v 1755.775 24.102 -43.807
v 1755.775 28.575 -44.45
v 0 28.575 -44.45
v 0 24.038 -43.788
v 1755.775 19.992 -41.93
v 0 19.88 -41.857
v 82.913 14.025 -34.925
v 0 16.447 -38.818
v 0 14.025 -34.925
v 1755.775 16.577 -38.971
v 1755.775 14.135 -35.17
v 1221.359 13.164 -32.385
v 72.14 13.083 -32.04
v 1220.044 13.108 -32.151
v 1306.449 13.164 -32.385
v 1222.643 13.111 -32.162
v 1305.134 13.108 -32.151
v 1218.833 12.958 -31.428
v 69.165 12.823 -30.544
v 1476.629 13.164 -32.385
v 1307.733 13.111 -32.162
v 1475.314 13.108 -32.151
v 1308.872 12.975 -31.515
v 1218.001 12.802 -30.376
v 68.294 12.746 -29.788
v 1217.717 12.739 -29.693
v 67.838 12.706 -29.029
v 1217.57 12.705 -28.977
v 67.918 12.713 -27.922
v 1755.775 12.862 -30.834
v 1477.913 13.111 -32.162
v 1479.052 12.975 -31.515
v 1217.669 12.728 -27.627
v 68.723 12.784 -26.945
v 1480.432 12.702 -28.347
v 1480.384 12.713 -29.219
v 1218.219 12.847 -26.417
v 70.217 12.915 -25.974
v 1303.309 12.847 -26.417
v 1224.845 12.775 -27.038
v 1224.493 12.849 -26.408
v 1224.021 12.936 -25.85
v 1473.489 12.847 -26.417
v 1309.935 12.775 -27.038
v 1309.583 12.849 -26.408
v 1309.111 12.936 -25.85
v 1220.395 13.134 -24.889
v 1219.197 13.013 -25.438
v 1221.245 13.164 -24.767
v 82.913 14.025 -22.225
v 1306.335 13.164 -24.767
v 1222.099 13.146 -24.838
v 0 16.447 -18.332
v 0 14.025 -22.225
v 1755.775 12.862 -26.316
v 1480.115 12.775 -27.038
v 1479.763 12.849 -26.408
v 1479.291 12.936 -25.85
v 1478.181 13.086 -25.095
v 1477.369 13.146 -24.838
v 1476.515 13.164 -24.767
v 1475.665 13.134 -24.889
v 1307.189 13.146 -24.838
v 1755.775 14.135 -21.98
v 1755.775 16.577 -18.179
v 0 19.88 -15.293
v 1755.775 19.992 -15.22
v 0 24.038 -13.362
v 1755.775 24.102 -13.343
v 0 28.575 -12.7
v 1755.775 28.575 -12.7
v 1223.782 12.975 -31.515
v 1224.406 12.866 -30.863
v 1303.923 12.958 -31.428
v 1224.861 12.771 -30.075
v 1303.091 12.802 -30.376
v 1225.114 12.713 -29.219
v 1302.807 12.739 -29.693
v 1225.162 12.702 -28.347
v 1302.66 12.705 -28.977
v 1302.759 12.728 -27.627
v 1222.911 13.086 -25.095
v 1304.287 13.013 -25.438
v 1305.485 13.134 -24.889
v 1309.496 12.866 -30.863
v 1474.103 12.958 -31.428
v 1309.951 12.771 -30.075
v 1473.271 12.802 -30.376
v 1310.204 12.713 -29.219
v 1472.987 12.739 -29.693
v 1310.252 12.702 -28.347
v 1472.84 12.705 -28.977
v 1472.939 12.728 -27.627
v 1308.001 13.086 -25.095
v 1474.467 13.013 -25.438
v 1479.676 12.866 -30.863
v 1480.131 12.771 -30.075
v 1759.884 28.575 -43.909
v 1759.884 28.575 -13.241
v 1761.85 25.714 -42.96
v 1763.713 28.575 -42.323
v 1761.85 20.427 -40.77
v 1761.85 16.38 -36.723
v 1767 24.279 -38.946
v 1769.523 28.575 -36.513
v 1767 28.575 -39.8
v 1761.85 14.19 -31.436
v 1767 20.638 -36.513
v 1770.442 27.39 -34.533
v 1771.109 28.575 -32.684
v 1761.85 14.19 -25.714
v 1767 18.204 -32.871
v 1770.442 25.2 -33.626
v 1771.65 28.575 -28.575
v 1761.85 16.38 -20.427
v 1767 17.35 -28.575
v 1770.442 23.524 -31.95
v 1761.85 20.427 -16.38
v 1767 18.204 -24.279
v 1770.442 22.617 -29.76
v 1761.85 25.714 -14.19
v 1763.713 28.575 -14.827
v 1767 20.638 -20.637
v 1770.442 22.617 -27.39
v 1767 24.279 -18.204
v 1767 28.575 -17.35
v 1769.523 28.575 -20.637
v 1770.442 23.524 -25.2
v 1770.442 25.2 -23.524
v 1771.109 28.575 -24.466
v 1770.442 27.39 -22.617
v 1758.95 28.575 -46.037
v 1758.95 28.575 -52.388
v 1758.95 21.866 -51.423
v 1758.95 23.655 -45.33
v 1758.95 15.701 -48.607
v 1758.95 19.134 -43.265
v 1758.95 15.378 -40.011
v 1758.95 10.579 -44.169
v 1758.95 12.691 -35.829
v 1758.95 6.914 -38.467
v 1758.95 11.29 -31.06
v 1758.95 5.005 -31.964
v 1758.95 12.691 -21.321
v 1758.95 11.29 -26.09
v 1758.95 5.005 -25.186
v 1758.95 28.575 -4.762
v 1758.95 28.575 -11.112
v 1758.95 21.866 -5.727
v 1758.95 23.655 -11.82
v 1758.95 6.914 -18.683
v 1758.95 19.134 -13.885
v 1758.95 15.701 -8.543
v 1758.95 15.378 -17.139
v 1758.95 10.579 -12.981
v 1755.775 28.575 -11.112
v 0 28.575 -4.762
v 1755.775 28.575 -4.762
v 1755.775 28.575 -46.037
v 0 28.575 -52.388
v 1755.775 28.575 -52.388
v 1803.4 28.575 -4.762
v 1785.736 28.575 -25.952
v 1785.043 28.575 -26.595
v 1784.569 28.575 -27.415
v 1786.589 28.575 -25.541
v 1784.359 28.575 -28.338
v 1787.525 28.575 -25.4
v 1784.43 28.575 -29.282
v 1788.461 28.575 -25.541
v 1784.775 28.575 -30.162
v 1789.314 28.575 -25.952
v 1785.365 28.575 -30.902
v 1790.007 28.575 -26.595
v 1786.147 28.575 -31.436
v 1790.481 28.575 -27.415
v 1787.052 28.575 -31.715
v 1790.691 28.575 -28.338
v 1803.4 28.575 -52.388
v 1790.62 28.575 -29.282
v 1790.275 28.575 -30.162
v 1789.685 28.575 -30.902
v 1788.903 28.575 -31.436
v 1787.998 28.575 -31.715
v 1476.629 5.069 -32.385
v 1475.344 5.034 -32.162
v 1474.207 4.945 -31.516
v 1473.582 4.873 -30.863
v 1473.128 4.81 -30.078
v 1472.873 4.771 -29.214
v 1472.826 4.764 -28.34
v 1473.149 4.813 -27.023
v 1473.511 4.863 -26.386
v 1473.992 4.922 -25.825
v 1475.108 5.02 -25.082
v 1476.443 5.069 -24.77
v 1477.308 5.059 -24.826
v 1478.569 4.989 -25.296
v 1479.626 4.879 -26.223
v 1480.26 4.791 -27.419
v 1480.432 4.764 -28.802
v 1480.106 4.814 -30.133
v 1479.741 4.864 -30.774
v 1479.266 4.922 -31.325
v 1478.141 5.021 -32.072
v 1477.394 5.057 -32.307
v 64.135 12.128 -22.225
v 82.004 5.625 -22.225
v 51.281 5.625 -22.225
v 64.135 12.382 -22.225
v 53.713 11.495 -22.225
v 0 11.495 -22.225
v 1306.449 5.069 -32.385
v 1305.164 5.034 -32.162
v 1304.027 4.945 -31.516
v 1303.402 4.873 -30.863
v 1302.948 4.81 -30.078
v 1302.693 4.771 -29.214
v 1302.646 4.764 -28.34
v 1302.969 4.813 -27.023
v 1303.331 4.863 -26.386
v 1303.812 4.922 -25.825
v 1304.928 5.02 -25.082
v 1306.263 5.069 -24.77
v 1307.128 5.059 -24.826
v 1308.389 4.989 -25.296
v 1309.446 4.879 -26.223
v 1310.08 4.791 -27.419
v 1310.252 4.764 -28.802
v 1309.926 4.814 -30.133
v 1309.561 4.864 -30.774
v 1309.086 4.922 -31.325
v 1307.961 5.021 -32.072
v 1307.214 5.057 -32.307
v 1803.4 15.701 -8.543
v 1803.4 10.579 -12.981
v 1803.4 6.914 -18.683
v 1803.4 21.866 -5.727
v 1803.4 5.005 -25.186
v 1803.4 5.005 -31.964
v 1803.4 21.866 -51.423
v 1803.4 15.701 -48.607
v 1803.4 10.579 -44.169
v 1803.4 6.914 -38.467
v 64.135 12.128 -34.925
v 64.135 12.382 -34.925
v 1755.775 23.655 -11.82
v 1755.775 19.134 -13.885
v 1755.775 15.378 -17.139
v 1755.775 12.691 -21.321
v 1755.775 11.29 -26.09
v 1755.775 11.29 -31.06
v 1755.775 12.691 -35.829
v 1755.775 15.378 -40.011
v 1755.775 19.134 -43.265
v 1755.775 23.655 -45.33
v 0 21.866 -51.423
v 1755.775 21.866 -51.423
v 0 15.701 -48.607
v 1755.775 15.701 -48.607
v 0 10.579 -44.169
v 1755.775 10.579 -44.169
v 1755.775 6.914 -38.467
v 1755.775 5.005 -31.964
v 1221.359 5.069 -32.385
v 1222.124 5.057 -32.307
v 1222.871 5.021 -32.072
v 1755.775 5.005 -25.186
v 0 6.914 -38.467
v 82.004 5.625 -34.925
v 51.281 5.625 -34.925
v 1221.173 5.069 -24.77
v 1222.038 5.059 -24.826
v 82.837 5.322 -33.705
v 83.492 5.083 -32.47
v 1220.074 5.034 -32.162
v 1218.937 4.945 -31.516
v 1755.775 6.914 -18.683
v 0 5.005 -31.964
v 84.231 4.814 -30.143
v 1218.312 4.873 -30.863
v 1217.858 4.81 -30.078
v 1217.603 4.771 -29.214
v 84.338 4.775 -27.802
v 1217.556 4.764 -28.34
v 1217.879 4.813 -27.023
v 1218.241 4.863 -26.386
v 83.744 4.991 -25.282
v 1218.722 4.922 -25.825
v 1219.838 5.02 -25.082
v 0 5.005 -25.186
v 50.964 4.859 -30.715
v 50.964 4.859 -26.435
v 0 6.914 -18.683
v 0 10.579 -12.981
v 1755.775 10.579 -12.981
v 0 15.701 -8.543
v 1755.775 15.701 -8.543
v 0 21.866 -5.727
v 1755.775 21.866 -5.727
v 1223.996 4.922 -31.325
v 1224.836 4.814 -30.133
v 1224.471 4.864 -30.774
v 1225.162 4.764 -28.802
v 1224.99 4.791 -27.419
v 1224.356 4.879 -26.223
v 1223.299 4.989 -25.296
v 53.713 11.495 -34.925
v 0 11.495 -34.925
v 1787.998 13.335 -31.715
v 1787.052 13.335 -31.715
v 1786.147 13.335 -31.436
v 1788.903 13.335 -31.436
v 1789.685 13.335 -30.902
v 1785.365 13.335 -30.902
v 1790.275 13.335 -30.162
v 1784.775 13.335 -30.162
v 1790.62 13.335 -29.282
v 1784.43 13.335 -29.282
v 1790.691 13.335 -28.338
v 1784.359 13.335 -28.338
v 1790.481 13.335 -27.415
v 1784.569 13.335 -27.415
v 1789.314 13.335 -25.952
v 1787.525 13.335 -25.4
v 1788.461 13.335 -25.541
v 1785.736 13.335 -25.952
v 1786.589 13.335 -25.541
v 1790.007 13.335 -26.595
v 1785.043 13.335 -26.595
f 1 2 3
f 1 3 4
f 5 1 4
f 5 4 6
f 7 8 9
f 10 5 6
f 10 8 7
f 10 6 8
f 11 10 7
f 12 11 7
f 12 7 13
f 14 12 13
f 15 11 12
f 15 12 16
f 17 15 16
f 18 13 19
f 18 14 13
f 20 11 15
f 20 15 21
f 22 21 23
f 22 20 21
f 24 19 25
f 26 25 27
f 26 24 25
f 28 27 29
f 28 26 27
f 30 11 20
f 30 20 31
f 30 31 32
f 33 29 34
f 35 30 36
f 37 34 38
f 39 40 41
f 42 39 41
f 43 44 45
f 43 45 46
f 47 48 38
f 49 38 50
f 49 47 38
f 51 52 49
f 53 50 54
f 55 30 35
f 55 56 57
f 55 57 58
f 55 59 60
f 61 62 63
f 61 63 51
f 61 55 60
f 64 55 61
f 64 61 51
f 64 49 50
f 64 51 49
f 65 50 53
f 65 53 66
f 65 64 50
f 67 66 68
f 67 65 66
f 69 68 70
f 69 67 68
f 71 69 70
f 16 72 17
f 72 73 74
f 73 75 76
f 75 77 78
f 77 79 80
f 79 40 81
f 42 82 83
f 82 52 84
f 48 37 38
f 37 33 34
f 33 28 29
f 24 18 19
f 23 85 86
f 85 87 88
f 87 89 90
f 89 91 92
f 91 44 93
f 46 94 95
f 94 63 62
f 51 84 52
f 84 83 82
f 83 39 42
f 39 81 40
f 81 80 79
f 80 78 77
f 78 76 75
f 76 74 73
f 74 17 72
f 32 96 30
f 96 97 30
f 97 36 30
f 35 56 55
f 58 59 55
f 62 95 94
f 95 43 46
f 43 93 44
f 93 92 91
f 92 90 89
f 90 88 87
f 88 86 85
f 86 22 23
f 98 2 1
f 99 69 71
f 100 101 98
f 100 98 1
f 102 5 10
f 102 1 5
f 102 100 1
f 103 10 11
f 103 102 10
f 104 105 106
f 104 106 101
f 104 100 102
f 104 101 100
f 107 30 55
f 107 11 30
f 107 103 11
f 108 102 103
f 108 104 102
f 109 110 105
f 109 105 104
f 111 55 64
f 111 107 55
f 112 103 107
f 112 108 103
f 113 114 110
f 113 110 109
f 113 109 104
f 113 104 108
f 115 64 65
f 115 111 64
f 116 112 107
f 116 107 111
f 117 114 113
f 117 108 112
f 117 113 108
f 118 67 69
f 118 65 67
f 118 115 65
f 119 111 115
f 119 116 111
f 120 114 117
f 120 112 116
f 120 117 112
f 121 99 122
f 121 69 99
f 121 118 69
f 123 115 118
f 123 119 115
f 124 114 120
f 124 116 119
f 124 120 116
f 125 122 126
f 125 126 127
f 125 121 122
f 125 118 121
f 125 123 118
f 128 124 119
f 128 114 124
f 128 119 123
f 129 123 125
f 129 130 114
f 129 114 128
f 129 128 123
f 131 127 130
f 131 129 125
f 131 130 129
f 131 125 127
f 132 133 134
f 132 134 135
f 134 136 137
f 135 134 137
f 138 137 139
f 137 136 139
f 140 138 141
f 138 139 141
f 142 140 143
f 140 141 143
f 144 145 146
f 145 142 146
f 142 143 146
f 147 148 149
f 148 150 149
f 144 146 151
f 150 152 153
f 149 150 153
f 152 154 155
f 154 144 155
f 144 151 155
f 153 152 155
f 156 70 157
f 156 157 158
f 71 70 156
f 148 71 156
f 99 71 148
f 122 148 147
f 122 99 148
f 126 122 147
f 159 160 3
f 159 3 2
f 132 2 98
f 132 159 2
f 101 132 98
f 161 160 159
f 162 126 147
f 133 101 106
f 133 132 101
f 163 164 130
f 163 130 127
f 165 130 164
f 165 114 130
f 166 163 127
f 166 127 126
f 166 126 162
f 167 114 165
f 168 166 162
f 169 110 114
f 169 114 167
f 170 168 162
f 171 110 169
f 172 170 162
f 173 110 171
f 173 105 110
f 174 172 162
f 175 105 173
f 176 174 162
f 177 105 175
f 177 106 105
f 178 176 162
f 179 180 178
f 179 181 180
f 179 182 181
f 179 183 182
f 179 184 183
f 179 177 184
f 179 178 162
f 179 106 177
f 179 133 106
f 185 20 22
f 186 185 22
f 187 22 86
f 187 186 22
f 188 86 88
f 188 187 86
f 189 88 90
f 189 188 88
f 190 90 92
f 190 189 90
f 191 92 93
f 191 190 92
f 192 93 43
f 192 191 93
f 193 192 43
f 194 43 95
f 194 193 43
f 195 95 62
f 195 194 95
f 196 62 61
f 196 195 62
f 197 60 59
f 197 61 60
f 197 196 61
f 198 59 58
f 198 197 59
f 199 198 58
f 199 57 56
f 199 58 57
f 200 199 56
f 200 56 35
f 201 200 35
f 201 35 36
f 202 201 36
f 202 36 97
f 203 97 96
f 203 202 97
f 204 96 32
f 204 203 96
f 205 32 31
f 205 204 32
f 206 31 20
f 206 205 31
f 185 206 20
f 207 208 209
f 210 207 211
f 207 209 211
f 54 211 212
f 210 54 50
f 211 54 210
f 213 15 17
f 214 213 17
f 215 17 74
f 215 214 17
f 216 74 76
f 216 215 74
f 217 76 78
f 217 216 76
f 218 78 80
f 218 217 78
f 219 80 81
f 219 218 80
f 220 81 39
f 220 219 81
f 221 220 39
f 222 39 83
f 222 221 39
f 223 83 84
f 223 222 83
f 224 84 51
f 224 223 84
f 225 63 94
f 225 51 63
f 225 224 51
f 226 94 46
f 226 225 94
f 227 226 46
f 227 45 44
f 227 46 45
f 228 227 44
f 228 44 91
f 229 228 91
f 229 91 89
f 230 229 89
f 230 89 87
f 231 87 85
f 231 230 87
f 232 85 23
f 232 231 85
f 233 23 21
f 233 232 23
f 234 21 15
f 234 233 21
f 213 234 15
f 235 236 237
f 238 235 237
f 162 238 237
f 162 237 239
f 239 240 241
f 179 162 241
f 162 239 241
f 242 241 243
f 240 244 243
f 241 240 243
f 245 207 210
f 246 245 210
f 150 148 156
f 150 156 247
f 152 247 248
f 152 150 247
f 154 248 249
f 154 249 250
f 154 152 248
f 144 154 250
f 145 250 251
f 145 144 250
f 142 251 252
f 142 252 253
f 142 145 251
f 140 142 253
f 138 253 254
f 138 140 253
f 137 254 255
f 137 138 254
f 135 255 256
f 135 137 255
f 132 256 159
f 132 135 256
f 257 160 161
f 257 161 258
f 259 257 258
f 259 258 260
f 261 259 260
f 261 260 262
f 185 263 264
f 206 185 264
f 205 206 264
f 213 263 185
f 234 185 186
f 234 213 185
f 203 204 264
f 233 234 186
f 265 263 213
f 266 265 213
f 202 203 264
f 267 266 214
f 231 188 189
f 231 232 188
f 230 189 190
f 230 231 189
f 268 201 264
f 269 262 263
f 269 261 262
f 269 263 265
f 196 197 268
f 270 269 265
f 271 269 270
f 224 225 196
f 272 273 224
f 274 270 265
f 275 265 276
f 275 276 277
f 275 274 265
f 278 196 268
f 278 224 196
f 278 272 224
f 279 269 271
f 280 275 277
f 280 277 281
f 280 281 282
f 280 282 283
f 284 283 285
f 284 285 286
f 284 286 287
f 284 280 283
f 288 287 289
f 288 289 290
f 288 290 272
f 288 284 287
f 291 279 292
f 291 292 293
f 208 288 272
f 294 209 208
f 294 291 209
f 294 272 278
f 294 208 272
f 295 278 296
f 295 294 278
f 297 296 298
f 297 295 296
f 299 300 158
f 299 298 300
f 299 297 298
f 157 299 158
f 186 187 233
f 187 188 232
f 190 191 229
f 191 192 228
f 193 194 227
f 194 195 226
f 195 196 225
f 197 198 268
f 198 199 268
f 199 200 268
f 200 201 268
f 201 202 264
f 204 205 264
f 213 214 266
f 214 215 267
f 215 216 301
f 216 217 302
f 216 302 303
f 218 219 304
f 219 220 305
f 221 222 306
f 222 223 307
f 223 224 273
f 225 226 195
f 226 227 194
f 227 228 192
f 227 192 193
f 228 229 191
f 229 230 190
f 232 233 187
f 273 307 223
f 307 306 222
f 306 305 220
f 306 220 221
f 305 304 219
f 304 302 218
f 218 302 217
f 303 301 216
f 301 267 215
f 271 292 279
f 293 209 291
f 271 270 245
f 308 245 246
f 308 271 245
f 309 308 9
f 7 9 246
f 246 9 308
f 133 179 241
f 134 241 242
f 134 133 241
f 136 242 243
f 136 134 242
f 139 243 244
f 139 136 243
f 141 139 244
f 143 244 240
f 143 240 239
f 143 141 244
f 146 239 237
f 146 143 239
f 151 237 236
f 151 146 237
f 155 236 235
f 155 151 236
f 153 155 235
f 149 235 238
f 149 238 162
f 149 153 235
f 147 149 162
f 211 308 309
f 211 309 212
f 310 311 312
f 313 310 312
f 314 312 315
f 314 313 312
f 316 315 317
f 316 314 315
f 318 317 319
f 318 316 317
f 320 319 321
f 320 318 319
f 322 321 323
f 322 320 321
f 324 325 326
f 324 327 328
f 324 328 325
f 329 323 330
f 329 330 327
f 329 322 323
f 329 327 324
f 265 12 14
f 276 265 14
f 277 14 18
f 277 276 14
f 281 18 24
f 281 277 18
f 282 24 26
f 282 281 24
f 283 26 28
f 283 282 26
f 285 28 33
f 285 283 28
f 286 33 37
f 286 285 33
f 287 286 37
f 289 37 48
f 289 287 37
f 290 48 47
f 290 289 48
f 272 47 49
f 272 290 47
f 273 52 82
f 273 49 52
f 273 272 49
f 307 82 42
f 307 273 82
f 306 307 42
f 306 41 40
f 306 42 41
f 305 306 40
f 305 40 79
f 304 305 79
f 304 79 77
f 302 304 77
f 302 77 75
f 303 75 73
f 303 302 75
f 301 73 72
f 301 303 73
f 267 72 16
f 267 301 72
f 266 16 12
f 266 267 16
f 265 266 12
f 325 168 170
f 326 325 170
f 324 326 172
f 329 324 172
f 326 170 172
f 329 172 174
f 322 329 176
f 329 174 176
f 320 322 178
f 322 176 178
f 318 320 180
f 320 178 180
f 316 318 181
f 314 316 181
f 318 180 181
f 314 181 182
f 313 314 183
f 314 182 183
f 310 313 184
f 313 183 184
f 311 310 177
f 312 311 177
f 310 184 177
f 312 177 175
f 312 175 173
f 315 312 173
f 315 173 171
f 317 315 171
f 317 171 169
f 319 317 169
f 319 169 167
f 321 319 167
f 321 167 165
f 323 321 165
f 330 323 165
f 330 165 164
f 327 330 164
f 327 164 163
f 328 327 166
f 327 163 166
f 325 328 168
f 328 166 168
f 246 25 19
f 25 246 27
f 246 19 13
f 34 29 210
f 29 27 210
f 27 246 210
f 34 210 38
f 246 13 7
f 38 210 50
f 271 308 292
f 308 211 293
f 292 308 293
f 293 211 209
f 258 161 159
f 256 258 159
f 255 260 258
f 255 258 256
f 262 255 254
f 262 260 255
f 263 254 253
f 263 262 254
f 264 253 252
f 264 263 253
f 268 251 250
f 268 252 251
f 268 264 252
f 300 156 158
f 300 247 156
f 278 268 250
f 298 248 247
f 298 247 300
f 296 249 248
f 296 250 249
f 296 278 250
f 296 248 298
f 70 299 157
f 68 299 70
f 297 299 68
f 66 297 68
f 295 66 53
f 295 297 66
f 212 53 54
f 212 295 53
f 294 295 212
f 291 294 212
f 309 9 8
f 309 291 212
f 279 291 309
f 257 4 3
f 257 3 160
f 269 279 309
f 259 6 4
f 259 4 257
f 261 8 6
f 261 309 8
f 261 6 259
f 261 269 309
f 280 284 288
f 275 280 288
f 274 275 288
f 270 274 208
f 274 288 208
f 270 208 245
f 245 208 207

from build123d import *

# Parameters (mm, degrees)
SKETCH1_W                   = 1803.4
SKETCH1_H                   = 57.15
WOOD_BLOCK_DEPTH            = 28.575
FIPPLE_DEPTH                = 6.35
SKETCH3_R                   = 3.81
FINGER_HOLES_DEPTH          = 1805.531577204
FIPPLE_INSIDE_CHAMFER_DEPTH = 6.35
SKETCH8_W                   = 12.7
SKETCH8_H                   = 6.694937241
FLUE_DEPTH                  = 58.42
SKETCH10_R                  = 3.175
DOWEL_PIN_HOLE_DEPTH        = 15.24
SKETCH6_OUTSIDE_W           = 420.056
SKETCH6_OUTSIDE_H           = 391.481
SKETCH6_OUTSIDE_R           = 23.8125
OUTSIDE_DIAMETER_DEPTH      = 1805.531577205
SKETCH11_W                  = 3.175
SKETCH11_H                  = 6.35


with BuildPart() as part:
    # Sketch1 → wood block (new body)
    with BuildSketch(Plane(origin=(0, 0, 0), x_dir=(1, 0, 0), z_dir=(0, 1, 0))):
        with Locations((901.7, 28.575)):
            Rectangle(SKETCH1_W, SKETCH1_H)
    extrude(amount=WOOD_BLOCK_DEPTH)

    # Sketch2 → Inner Bore (revolve, cut)
    with BuildSketch(Plane.XY.offset(-28.575)):
        with BuildLine():
            Line((1771.65, 28.575), (-15.875, 28.575))
            ThreePointArc((-15.875, 28.575), (-11.225320151, 17.349679849), (0, 12.7))
            Line((0, 12.7), (1755.775, 12.7))
            ThreePointArc((1755.775, 12.7), (1767.000320151, 17.349679849), (1771.65, 28.575))
        make_face()
    revolve(axis=Axis((1771.65, 28.575, -28.575), (-1, 0, 0)), mode=Mode.SUBTRACT)

    # Sketch5 → fipple (cut, symmetric)
    with BuildSketch(Plane.XY.offset(-28.575)):
        Polygon((53.975, 28.575), (53.975, 12.1285), (48.951210809, 0), (53.975, 0), (64.135, 0), (97.457779882, 0), (64.135, 12.1285), (64.135, 28.575), align=None)
    extrude(amount=FIPPLE_DEPTH, both=True, mode=Mode.SUBTRACT)

    # Sketch3 → finger holes (cut, through all)
    with BuildSketch(Plane(origin=(0, 0, 0), x_dir=(1, 0, 0), z_dir=(0, 1, 0))):
        with Locations(Location((1476.629, 28.575, 0), (0, 0, 90))):
            Circle(SKETCH3_R)
        with Locations(Location((1306.449, 28.575, 0), (0, 0, 90))):
            Circle(SKETCH3_R)
        with Locations(Location((1221.359, 28.575, 0), (0, 0, 90))):
            Circle(SKETCH3_R)
    extrude(amount=FINGER_HOLES_DEPTH, mode=Mode.SUBTRACT)

    # Sketch9 → fipple inside chamfer (cut, symmetric)
    with BuildSketch(Plane.XY.offset(-28.575)):
        Polygon((64.135, 12.3825), (84.373651693, 14.153152588), (64.135, 16.801291368), align=None)
    extrude(amount=FIPPLE_INSIDE_CHAMFER_DEPTH, both=True, mode=Mode.SUBTRACT)

    # Sketch8 → flue (cut)
    with BuildSketch(Plane.ZY):
        with Locations((-28.575, 14.842545711)):
            Rectangle(SKETCH8_W, SKETCH8_H)
    extrude(amount=-FLUE_DEPTH, mode=Mode.SUBTRACT)

    # Sketch10 → dowel pin hole (cut)
    with BuildSketch(Plane(origin=(0, 28.575, 0), x_dir=(1, 0, 0), z_dir=(0, 1, 0))):
        with Locations(Location((1787.525, 28.575, 0), (0, 0, 270))):
            Circle(SKETCH10_R)
    extrude(amount=-DOWEL_PIN_HOLE_DEPTH, mode=Mode.SUBTRACT)

    # Sketch6 outside → outside diameter (cut, through all)
    with BuildSketch(Plane.ZY):
        with Locations((-28.575, 14.2875)):
            Rectangle(SKETCH6_OUTSIDE_W, SKETCH6_OUTSIDE_H)
        with Locations((-28.575, 28.575)):
            Circle(SKETCH6_OUTSIDE_R, mode=Mode.SUBTRACT)
    extrude(amount=-OUTSIDE_DIAMETER_DEPTH, mode=Mode.SUBTRACT)

    # Sketch11 → end length locator (revolve, cut)
    with BuildSketch(Plane(origin=(0, 28.575, 0), x_dir=(1, 0, 0), z_dir=(0, 1, 0))):
        with Locations((1757.3625, 7.9375)):
            Rectangle(SKETCH11_W, SKETCH11_H)
    revolve(axis=Axis((0, 28.575, -28.575), (1, 0, 0)), mode=Mode.SUBTRACT)


solid = part.part
